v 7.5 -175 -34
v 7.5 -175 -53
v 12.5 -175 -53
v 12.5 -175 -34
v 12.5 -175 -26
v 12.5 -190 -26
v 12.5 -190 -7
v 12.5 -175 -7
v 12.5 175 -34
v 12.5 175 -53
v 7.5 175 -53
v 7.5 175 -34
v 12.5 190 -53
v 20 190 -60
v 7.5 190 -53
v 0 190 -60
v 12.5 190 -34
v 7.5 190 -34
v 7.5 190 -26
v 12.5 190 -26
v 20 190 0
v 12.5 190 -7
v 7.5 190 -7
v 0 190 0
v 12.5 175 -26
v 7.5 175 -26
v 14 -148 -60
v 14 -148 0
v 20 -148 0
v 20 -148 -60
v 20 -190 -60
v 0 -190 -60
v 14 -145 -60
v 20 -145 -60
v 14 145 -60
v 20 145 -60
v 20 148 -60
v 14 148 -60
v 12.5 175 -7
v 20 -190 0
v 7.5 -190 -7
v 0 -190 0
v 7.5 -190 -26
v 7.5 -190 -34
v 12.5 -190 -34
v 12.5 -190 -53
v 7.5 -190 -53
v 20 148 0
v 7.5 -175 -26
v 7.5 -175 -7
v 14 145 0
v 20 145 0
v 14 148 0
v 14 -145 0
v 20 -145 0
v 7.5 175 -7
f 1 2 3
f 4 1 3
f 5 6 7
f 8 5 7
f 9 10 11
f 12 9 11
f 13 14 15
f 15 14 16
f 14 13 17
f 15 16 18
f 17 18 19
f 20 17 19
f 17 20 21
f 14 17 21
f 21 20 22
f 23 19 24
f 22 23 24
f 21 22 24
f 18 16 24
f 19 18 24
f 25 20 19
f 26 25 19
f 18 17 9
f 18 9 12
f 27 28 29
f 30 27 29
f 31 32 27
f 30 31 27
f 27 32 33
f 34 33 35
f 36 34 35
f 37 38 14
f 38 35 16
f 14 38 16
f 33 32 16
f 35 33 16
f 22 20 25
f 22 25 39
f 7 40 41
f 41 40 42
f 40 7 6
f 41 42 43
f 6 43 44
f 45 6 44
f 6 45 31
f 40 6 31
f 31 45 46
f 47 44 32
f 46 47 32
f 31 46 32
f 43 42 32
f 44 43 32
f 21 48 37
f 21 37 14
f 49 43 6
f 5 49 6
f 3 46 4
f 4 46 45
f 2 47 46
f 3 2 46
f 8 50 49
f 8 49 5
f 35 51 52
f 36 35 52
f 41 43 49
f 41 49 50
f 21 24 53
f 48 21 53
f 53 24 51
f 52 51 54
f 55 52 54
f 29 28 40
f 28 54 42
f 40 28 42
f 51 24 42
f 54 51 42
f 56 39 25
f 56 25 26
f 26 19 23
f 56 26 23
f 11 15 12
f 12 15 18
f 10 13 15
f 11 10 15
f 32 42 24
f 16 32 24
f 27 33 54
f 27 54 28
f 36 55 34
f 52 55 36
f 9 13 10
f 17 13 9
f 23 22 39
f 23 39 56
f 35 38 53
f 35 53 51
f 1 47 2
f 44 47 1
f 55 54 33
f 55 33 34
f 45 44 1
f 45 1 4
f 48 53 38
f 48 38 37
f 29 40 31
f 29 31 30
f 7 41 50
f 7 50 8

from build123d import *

# Parameters (mm, degrees)
F1_DEPTH = 20
F2_W     = 6
F2_H     = 3
F3_DEPTH = 60
F4_W     = 5
F4_H     = 19
F5_DEPTH = 15
F6_W     = 5
F6_H     = 19
F7_DEPTH = 15


# Not quite as in the source:
# - a feature names something its author has since deleted; it is built from what else it names


with BuildPart() as f1:
    # F0 (on Right) → F1 (new body)
    with BuildSketch(Plane.YZ):
        Polygon((190, 0), (-190, 0), (-190, -60), (0, -60), (190, -60), align=None)
    extrude(amount=F1_DEPTH)

    # F2 (on face) → F3 (cut)
    with BuildSketch(Plane(origin=(0, 0, -60), x_dir=(1, 0, 0), z_dir=(0, 0, -1))):
        with Locations((17, 146.5)):
            Rectangle(F2_W, F2_H)
        with Locations((17, -146.5)):
            Rectangle(F2_W, F2_H)
    extrude(amount=-F3_DEPTH, mode=Mode.SUBTRACT)

    # F4 (on face) → F5 (cut)
    with BuildSketch(Plane.XZ.offset(190)):
        with Locations((10, -16.5)):
            Rectangle(F4_W, F4_H)
        with Locations((10, -43.5)):
            Rectangle(F4_W, F4_H)
    extrude(amount=-F5_DEPTH, mode=Mode.SUBTRACT)

    # F6 (on face) → F7 (cut)
    with BuildSketch(Plane(origin=(0, 190, 0), x_dir=(-1, 0, 0), z_dir=(0, 1, 0))):
        with Locations((-10, -16.5)):
            Rectangle(F6_W, F6_H)
        with Locations((-10, -43.5)):
            Rectangle(F6_W, F6_H)
    extrude(amount=-F7_DEPTH, mode=Mode.SUBTRACT)


solid = f1.part
